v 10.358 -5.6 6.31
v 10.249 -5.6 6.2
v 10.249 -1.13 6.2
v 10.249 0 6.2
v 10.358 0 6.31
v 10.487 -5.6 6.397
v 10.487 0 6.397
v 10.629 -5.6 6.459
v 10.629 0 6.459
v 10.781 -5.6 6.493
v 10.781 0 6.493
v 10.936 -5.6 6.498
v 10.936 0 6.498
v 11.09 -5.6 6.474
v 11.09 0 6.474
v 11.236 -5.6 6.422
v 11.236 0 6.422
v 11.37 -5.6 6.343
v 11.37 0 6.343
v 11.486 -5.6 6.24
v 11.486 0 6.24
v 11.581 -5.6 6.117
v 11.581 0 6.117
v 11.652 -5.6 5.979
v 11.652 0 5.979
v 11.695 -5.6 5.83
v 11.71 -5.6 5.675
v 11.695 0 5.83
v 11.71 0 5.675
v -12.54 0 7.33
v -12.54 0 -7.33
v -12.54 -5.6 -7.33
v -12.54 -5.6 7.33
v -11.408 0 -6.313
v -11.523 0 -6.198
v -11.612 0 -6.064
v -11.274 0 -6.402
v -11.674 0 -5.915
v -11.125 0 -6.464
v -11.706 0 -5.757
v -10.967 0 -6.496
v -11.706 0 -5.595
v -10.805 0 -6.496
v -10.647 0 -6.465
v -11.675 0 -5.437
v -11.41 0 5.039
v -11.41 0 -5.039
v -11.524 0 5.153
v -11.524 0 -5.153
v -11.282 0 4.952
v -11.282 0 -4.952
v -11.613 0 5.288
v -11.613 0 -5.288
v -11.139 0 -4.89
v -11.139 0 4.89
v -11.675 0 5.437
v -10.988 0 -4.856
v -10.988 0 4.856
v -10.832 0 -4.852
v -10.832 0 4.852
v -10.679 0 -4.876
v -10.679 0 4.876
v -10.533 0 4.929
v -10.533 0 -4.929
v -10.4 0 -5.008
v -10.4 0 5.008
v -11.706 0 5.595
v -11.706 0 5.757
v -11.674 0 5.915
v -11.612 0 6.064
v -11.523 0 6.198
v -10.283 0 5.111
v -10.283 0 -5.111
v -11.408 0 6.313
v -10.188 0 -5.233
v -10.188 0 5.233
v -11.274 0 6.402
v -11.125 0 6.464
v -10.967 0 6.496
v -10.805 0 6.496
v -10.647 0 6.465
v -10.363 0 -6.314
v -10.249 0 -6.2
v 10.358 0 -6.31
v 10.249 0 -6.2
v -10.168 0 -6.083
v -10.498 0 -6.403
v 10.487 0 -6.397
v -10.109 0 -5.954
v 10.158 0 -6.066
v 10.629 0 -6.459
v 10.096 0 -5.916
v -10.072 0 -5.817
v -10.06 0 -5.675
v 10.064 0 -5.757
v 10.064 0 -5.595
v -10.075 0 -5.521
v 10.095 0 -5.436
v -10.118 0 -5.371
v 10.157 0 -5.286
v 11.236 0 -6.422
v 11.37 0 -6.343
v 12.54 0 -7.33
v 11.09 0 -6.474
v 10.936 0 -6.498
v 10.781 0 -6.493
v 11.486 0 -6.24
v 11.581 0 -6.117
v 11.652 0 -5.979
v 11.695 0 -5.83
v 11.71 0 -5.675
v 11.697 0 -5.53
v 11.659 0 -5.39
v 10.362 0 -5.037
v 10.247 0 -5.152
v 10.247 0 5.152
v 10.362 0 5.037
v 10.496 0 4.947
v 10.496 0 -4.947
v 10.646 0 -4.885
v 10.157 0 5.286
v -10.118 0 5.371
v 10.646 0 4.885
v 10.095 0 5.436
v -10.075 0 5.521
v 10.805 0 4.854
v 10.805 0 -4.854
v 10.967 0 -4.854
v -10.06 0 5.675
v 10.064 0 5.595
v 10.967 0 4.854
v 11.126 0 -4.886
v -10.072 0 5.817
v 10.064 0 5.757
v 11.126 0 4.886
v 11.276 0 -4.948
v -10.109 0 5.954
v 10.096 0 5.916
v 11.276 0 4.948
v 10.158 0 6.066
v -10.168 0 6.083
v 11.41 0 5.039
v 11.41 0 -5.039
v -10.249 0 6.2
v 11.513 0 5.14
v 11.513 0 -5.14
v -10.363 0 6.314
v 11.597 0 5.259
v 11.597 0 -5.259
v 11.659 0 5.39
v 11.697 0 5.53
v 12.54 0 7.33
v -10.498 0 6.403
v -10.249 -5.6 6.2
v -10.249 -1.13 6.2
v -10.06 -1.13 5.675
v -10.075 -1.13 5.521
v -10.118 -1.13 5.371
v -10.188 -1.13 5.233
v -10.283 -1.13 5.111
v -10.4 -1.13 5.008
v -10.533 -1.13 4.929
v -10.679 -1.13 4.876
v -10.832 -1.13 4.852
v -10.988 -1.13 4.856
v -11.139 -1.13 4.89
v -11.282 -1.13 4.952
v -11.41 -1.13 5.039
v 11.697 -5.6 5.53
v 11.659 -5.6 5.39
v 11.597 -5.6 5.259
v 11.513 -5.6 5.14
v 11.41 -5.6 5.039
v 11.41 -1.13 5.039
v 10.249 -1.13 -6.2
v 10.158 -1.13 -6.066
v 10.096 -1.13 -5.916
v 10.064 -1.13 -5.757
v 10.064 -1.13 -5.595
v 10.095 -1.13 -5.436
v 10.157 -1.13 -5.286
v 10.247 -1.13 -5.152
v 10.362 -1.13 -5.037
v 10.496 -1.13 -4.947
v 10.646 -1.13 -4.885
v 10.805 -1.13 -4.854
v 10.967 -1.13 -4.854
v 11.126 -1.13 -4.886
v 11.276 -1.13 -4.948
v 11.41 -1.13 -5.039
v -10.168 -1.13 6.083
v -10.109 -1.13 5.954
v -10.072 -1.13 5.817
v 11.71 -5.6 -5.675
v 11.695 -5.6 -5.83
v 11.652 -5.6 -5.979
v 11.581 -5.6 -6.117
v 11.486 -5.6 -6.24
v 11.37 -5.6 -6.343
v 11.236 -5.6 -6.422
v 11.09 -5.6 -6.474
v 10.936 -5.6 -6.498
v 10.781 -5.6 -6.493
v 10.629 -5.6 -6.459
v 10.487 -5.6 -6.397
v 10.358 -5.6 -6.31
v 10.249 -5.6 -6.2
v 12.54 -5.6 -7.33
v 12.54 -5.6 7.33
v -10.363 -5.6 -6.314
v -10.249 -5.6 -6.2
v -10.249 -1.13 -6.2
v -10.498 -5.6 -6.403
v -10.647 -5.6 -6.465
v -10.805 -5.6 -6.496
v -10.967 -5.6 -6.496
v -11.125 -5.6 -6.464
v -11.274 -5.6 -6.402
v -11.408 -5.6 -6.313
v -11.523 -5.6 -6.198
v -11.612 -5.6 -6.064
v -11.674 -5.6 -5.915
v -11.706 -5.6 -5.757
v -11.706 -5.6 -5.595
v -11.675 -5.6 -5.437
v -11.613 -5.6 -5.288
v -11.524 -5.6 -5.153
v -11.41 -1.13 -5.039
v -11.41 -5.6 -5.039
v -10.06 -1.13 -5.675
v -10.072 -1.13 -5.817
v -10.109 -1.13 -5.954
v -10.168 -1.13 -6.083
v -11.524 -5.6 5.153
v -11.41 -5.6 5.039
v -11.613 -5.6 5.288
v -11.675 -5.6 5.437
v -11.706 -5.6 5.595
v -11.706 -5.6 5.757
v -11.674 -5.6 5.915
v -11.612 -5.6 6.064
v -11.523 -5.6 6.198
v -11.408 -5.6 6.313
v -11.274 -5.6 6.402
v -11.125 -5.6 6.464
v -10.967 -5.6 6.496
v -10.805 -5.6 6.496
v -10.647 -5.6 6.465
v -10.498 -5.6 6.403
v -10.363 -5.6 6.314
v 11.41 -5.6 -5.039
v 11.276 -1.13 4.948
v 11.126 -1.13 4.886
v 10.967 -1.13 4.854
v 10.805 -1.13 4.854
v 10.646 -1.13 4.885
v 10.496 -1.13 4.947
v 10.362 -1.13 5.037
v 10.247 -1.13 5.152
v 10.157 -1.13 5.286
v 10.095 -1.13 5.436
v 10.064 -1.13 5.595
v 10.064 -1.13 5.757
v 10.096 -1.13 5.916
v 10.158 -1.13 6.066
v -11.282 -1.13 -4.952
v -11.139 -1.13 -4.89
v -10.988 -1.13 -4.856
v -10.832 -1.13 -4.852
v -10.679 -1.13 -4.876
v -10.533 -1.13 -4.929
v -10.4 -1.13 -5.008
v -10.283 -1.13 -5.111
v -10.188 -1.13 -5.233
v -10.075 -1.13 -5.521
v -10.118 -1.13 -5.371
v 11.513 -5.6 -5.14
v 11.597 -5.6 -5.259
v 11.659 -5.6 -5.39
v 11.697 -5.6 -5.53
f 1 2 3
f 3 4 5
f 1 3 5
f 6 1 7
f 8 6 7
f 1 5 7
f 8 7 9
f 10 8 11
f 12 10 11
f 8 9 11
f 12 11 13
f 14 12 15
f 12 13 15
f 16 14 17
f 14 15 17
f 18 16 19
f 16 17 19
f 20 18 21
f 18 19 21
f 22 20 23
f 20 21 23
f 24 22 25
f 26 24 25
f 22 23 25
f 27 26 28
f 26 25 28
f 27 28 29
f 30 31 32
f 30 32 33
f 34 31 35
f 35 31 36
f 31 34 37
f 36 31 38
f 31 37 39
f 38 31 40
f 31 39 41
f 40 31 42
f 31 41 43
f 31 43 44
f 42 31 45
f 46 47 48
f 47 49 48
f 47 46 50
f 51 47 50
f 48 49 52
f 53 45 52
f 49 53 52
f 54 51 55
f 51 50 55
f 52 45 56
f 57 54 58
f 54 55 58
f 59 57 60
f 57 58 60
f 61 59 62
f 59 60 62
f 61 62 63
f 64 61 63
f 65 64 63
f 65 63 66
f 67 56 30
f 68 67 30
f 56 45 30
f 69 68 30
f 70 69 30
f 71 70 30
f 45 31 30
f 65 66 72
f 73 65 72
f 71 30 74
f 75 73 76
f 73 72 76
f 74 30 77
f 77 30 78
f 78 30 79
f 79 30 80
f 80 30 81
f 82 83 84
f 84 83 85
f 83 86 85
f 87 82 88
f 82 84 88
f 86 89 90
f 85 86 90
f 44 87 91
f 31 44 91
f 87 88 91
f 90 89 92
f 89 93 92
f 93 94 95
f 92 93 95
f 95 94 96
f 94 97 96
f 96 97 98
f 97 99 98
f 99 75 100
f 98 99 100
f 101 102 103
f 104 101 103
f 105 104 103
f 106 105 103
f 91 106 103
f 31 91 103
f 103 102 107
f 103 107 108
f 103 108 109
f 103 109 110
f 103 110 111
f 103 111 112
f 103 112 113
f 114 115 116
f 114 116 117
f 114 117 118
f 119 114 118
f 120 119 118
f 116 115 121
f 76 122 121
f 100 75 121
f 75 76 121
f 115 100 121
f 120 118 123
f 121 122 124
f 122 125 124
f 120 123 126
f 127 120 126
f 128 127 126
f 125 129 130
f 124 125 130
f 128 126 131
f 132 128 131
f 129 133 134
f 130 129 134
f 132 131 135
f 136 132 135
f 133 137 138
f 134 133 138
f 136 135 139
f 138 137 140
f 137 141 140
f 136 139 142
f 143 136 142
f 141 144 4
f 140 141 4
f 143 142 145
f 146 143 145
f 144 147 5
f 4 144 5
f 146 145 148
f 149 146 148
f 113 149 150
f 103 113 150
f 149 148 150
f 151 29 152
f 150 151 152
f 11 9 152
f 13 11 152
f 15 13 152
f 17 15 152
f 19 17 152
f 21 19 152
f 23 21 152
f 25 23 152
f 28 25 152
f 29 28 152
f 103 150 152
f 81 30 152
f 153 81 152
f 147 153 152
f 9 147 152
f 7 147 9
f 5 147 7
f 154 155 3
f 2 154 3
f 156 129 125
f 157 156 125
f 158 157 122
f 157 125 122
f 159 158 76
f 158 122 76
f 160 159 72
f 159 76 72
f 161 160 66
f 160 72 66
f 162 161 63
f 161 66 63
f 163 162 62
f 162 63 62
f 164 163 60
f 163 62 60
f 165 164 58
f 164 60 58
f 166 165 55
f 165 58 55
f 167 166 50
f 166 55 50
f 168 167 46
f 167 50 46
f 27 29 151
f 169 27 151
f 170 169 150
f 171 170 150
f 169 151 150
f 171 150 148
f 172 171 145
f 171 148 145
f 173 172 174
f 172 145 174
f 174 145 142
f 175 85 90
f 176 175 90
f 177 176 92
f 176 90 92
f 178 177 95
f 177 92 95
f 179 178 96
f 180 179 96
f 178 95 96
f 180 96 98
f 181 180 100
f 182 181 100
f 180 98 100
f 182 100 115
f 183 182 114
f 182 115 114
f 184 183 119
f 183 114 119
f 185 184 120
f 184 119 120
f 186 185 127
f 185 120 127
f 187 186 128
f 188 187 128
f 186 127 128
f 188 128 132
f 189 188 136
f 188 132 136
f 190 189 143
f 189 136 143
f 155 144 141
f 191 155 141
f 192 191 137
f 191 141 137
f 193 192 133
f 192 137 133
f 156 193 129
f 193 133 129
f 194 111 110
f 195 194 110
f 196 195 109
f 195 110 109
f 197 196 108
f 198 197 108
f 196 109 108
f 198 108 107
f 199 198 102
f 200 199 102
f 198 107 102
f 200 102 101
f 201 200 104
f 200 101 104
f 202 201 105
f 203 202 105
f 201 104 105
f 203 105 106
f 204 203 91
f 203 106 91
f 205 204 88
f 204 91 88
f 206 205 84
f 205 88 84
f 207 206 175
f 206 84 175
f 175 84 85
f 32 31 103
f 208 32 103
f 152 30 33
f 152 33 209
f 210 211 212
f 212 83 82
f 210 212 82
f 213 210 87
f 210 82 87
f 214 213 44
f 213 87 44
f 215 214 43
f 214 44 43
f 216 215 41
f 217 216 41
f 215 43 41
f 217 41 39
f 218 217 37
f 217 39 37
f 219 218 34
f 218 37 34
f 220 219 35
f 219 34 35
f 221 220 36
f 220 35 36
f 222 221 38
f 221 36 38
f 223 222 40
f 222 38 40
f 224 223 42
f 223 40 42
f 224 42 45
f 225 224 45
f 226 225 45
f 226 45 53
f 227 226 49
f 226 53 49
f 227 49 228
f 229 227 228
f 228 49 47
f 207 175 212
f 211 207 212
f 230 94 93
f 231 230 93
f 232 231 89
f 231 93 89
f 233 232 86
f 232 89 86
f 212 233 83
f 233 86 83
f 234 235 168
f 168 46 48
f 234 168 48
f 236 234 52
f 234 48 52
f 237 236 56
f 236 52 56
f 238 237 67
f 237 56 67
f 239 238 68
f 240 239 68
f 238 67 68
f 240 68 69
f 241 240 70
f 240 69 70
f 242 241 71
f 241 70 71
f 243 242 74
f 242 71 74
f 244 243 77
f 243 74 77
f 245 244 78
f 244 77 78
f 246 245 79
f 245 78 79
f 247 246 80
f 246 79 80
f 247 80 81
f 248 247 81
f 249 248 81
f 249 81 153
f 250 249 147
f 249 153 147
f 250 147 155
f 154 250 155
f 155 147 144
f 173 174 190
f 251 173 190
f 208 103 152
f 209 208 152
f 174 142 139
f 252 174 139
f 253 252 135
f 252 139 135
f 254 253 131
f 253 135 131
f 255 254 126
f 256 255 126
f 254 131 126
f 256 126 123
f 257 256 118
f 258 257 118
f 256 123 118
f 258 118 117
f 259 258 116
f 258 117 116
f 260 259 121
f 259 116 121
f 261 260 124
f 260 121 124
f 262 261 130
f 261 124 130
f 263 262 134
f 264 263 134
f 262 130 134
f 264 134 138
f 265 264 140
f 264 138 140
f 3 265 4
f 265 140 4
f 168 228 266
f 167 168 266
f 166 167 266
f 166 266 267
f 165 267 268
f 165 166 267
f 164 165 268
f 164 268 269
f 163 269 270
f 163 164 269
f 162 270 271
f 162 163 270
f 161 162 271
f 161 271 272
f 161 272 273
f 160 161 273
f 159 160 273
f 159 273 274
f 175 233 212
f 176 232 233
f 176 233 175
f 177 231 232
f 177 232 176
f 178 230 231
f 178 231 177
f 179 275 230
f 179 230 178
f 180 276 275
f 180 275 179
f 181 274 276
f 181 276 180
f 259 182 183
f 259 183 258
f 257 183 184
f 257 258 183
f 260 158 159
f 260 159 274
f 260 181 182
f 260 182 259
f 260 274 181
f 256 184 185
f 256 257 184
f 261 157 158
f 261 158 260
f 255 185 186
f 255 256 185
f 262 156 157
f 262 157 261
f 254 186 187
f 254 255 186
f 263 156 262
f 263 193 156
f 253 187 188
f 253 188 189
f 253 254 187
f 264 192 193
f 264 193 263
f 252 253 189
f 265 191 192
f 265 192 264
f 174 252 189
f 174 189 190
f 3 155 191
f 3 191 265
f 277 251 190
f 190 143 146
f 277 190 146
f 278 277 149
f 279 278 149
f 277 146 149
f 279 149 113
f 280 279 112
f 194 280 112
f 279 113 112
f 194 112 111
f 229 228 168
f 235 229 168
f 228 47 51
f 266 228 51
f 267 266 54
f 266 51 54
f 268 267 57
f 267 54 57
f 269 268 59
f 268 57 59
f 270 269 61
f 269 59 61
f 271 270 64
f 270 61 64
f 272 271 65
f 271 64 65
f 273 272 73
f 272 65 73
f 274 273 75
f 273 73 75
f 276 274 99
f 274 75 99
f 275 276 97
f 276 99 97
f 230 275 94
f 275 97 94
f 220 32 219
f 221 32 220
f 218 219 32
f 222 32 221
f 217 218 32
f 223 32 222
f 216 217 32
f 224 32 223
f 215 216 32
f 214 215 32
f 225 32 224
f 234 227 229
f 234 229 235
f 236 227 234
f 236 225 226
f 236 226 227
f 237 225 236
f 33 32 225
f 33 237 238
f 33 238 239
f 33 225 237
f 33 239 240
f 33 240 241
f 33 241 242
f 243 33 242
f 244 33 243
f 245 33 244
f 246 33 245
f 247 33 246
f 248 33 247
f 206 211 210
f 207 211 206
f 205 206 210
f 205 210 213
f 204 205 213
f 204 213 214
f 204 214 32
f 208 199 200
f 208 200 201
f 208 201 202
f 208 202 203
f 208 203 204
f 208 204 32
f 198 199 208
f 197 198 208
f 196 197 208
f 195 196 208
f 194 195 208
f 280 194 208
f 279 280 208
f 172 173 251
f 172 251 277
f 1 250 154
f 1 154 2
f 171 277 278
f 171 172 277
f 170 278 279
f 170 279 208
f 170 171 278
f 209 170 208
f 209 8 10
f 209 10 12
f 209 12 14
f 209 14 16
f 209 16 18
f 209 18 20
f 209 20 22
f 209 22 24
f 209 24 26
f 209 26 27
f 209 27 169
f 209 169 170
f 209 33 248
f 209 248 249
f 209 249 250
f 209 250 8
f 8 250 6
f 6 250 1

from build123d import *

# Parameters (mm, degrees)
F0_W     = 25.08
F0_H     = 14.66
F1_DEPTH = 5.6
F2_DEPTH = 1.13


with BuildPart() as f1:
    # F0 (on Front) → F1 (new body)
    with BuildSketch(Plane.XZ):
        Rectangle(F0_W, F0_H)
        with BuildLine():
            Line((-10.2486038969, 6.2), (10.2486038969, 6.2))
            ThreePointArc((10.2486038969, 6.2), (11.1639249137, 6.4514186323), (11.71, 5.675))
            ThreePointArc((11.71, 5.675), (11.6312405778, 5.323218818), (11.41, 5.0386038969))
            Line((11.41, 5.0386038969), (11.41, -5.0386038969))
            ThreePointArc((11.41, -5.0386038969), (11.6312405778, -5.323218818), (11.71, -5.675))
            ThreePointArc((11.71, -5.675), (11.1639249137, -6.4514186323), (10.2486038969, -6.2))
            Line((10.2486038969, -6.2), (-10.2486038969, -6.2))
            ThreePointArc((-10.2486038969, -6.2), (-11.4683630945, -6.2583630945), (-11.41, -5.0386038969))
            Line((-11.41, -5.0386038969), (-11.41, 5.0386038969))
            ThreePointArc((-11.41, 5.0386038969), (-11.4683630945, 6.2583630945), (-10.2486038969, 6.2))
        make_face(mode=Mode.SUBTRACT)
    extrude(amount=F1_DEPTH)

    # F0 (on Front) → F2 (join)
    with BuildSketch(Plane.XZ):
        Rectangle(F0_W, F0_H)
        with BuildLine():
            Line((-10.2486038969, 6.2), (10.2486038969, 6.2))
            ThreePointArc((10.2486038969, 6.2), (11.1639249137, 6.4514186323), (11.71, 5.675))
            ThreePointArc((11.71, 5.675), (11.6312405778, 5.323218818), (11.41, 5.0386038969))
            Line((11.41, 5.0386038969), (11.41, -5.0386038969))
            ThreePointArc((11.41, -5.0386038969), (11.6312405778, -5.323218818), (11.71, -5.675))
            ThreePointArc((11.71, -5.675), (11.1639249137, -6.4514186323), (10.2486038969, -6.2))
            Line((10.2486038969, -6.2), (-10.2486038969, -6.2))
            ThreePointArc((-10.2486038969, -6.2), (-11.4683630945, -6.2583630945), (-11.41, -5.0386038969))
            Line((-11.41, -5.0386038969), (-11.41, 5.0386038969))
            ThreePointArc((-11.41, 5.0386038969), (-11.4683630945, 6.2583630945), (-10.2486038969, 6.2))
        make_face(mode=Mode.SUBTRACT)
        with BuildLine():
            ThreePointArc((11.41, 5.0386038969), (10.3016369055, 5.0916369055), (10.2486038969, 6.2))
            Line((10.2486038969, 6.2), (-10.2486038969, 6.2))
            ThreePointArc((-10.2486038969, 6.2), (-10.1085813677, 5.9539249137), (-10.06, 5.675))
            ThreePointArc((-10.06, 5.675), (-10.533218818, 4.9287594222), (-11.41, 5.0386038969))
            Line((-11.41, 5.0386038969), (-11.41, -5.0386038969))
            ThreePointArc((-11.41, -5.0386038969), (-10.533218818, -4.9287594222), (-10.06, -5.675))
            ThreePointArc((-10.06, -5.675), (-10.1085813677, -5.9539249137), (-10.2486038969, -6.2))
            Line((-10.2486038969, -6.2), (10.2486038969, -6.2))
            ThreePointArc((10.2486038969, -6.2), (10.3016369055, -5.0916369055), (11.41, -5.0386038969))
            Line((11.41, -5.0386038969), (11.41, 5.0386038969))
        make_face()
    extrude(amount=F2_DEPTH)


solid = f1.part
